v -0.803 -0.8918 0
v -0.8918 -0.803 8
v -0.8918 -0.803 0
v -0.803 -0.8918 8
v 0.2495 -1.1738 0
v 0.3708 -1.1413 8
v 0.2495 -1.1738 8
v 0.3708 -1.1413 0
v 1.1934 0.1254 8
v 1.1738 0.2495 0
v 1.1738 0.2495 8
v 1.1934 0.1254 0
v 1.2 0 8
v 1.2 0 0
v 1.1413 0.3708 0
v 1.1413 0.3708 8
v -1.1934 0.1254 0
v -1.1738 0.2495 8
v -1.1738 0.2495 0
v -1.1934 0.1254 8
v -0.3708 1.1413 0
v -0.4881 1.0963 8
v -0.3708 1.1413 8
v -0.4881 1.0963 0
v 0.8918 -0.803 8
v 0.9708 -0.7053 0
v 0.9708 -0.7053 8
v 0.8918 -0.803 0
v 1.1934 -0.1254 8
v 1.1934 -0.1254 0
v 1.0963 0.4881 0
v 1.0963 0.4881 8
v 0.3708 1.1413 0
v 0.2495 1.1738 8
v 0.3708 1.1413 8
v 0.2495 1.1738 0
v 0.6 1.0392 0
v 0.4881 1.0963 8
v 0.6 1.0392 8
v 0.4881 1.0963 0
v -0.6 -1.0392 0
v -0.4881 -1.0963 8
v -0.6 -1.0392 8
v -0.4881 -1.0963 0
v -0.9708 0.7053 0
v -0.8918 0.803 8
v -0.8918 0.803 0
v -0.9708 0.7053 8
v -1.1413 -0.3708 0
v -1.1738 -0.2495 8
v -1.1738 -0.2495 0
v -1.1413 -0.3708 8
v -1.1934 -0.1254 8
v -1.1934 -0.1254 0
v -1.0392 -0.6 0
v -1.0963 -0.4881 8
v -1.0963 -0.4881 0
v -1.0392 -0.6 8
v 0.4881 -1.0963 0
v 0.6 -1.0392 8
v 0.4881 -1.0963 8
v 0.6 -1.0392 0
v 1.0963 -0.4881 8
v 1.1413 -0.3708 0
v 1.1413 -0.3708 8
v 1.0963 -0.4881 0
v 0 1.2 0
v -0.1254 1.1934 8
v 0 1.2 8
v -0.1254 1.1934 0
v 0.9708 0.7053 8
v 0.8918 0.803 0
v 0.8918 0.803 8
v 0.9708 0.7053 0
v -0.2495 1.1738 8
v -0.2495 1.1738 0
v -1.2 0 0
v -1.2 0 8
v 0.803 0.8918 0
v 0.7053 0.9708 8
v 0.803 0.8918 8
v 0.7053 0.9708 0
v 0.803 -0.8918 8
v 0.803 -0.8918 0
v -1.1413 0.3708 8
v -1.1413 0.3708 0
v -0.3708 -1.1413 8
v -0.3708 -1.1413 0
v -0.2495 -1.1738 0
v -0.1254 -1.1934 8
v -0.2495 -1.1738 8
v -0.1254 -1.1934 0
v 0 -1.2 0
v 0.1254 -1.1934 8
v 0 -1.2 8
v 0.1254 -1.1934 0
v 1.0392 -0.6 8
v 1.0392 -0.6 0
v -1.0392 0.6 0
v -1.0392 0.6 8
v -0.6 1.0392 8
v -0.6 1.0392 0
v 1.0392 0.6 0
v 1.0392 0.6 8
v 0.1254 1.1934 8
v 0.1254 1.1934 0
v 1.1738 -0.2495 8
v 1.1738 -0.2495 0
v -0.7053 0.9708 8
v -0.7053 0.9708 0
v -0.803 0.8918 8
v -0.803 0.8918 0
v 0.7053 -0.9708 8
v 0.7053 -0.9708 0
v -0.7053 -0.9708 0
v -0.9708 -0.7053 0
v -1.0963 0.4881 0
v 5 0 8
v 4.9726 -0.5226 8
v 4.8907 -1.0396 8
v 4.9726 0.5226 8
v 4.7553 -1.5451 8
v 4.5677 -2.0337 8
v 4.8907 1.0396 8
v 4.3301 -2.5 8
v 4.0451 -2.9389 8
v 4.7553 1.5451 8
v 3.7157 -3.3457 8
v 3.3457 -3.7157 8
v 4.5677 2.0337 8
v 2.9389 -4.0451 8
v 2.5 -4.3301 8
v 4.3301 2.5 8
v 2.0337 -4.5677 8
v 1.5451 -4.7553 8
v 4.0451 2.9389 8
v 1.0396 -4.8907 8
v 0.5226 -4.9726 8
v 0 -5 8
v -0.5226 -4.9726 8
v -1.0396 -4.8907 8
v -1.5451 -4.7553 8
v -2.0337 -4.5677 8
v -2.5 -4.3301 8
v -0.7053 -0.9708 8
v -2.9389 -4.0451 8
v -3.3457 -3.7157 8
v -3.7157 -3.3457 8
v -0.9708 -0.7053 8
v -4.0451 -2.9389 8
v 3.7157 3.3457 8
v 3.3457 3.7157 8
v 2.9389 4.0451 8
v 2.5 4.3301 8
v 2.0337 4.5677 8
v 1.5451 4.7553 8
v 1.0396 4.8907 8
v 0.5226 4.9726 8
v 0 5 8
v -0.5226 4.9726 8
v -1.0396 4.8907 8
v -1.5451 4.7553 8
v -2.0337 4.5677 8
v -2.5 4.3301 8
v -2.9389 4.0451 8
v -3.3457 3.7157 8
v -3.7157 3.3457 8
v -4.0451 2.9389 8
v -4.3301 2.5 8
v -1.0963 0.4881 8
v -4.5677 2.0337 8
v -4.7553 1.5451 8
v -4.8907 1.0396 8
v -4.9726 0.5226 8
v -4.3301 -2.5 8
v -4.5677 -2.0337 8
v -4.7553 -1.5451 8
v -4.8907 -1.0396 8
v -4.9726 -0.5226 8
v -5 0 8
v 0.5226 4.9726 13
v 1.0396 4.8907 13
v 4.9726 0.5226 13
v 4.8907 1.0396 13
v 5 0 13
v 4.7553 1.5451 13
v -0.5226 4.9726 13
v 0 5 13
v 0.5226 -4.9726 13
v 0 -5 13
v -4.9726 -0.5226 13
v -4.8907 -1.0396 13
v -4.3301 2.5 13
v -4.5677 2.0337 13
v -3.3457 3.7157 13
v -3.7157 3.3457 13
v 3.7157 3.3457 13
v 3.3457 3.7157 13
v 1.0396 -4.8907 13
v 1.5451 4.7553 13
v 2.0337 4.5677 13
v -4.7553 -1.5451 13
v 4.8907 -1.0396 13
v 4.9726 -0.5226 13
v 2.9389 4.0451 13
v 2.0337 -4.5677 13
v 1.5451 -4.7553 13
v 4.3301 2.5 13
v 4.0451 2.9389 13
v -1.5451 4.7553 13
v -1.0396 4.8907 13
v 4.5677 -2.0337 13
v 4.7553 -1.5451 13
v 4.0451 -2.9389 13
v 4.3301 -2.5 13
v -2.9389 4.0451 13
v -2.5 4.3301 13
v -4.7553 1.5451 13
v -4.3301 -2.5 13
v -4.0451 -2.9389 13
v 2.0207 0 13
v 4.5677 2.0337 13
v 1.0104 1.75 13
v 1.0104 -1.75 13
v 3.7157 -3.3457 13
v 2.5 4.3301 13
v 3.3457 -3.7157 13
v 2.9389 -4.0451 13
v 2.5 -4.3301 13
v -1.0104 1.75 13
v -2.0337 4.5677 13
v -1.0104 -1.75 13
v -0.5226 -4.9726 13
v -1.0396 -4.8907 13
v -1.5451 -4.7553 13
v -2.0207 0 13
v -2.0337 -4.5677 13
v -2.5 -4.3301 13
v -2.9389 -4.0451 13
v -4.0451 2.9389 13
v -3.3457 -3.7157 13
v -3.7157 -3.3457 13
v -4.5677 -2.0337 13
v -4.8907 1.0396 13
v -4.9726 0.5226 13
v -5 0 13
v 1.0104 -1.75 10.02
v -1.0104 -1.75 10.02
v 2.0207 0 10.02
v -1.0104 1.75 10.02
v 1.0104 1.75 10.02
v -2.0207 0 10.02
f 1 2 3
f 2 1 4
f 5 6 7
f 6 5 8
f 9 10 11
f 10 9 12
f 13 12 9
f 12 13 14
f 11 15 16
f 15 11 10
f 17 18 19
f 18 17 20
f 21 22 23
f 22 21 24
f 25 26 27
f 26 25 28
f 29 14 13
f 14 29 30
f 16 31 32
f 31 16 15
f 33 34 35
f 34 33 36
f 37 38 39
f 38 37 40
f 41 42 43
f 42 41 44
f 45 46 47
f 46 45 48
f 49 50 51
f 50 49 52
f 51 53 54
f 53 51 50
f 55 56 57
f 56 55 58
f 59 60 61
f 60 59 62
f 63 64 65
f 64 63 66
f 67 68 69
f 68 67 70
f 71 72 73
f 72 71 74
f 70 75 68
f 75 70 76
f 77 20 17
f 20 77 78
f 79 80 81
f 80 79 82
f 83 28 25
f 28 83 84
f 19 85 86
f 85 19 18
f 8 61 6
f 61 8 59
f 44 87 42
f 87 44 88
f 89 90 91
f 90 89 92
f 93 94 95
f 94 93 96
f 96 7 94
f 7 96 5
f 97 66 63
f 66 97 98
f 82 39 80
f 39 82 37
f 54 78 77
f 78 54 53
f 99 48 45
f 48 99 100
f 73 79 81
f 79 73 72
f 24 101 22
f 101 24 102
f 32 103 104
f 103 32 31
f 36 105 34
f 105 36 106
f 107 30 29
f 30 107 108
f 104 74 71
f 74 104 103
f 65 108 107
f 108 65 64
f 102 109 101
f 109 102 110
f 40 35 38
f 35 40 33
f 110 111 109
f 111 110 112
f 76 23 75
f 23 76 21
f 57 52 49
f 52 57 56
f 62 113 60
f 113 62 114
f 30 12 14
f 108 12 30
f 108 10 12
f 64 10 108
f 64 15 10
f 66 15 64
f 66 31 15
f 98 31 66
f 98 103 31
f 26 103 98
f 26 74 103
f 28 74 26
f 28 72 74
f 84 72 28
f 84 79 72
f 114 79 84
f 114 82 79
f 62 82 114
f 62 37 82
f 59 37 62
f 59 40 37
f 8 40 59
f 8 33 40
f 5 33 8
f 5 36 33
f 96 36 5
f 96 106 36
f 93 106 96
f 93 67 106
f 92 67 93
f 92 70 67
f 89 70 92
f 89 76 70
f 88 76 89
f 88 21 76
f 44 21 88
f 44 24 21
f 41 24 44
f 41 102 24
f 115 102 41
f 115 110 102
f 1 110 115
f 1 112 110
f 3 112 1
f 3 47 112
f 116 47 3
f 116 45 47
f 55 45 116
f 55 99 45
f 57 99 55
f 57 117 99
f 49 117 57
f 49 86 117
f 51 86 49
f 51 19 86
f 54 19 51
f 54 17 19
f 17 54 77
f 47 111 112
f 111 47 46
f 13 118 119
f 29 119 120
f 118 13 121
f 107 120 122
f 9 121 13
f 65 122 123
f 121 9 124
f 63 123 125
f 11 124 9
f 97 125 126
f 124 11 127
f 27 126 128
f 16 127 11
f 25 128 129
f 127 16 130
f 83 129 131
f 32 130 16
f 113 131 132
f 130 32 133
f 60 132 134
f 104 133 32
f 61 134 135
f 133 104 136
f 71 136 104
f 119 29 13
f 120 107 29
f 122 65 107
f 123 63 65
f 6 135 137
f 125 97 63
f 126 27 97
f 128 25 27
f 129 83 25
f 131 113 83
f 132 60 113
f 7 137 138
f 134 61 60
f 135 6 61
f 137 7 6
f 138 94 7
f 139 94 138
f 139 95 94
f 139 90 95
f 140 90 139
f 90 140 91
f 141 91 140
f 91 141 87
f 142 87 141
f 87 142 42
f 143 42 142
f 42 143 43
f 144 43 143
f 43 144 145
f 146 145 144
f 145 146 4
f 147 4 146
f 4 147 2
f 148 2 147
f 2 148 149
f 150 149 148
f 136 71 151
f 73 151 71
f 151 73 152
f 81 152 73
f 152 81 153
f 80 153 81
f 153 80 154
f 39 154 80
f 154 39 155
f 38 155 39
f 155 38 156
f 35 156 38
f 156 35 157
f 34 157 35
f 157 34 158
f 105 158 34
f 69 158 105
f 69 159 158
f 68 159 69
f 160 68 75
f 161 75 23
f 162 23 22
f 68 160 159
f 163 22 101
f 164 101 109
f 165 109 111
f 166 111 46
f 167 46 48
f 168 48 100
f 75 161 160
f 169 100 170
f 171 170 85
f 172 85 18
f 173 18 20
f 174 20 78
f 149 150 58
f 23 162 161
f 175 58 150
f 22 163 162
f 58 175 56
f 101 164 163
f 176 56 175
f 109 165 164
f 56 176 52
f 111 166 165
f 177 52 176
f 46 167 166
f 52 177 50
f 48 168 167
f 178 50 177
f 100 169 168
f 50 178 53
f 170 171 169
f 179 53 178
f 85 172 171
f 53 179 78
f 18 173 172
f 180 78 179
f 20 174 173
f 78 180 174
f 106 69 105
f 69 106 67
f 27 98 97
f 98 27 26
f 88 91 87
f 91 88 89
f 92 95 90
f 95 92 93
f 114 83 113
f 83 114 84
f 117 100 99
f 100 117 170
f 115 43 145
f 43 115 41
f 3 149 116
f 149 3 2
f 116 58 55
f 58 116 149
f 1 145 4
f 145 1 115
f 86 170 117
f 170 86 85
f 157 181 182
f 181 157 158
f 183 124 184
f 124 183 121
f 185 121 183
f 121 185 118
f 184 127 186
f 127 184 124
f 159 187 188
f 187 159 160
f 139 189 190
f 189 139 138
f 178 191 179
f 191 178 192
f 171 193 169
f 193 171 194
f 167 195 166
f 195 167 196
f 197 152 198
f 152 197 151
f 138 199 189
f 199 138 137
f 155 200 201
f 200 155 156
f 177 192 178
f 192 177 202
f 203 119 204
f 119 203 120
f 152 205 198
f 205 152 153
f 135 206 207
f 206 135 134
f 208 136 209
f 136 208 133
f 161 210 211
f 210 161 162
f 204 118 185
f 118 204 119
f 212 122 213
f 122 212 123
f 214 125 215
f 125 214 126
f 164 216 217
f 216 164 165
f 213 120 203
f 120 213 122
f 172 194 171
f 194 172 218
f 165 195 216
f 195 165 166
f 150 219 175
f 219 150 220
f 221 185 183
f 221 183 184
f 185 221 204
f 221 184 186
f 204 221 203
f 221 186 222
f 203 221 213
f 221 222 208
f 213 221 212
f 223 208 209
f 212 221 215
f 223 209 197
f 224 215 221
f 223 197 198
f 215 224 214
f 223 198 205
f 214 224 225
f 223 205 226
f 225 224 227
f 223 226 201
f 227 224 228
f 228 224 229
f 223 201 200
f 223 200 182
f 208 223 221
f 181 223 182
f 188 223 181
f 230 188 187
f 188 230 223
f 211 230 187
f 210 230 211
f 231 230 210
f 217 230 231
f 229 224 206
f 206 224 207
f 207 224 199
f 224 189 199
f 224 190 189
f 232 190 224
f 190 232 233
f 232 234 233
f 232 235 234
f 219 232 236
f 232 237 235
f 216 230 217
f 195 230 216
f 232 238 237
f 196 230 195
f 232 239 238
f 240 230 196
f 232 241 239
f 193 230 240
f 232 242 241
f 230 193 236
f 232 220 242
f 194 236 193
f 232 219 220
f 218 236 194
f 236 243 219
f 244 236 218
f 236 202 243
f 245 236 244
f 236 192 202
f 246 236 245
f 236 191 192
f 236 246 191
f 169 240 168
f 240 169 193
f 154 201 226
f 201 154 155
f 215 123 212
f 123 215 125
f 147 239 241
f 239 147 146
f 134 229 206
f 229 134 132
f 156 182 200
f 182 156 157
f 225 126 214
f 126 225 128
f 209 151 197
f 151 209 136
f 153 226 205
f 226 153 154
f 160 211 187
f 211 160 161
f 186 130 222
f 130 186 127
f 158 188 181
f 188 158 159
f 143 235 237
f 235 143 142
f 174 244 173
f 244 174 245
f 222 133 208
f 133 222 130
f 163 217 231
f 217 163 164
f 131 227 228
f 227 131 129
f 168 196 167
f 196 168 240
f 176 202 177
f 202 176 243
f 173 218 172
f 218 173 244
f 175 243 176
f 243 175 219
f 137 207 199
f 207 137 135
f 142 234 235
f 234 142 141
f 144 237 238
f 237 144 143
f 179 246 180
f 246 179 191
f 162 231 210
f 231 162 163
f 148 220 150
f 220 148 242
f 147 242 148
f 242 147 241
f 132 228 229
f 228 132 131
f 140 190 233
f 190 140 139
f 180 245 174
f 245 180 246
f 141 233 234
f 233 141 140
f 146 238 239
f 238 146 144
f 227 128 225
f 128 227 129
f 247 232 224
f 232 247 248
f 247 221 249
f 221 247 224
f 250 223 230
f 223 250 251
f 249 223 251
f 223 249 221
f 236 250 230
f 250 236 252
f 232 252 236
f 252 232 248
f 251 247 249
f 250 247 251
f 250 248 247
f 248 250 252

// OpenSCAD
// Thumb screw, smooth-shank representation.
$fn = 60;
eps = 0.02;
shaft_d = 2.4;
head_d = 10;
shaft_l = 8;
head_h = 5;
difference() {
    union() { cylinder(d = shaft_d, h = shaft_l); translate([0, 0, shaft_l]) cylinder(d = head_d, h = head_h); }
    translate([0, 0, shaft_l + head_h - 3 + eps]) cylinder(d = head_d * 0.35 / cos(30), h = 3 + eps, $fn = 6);
}
